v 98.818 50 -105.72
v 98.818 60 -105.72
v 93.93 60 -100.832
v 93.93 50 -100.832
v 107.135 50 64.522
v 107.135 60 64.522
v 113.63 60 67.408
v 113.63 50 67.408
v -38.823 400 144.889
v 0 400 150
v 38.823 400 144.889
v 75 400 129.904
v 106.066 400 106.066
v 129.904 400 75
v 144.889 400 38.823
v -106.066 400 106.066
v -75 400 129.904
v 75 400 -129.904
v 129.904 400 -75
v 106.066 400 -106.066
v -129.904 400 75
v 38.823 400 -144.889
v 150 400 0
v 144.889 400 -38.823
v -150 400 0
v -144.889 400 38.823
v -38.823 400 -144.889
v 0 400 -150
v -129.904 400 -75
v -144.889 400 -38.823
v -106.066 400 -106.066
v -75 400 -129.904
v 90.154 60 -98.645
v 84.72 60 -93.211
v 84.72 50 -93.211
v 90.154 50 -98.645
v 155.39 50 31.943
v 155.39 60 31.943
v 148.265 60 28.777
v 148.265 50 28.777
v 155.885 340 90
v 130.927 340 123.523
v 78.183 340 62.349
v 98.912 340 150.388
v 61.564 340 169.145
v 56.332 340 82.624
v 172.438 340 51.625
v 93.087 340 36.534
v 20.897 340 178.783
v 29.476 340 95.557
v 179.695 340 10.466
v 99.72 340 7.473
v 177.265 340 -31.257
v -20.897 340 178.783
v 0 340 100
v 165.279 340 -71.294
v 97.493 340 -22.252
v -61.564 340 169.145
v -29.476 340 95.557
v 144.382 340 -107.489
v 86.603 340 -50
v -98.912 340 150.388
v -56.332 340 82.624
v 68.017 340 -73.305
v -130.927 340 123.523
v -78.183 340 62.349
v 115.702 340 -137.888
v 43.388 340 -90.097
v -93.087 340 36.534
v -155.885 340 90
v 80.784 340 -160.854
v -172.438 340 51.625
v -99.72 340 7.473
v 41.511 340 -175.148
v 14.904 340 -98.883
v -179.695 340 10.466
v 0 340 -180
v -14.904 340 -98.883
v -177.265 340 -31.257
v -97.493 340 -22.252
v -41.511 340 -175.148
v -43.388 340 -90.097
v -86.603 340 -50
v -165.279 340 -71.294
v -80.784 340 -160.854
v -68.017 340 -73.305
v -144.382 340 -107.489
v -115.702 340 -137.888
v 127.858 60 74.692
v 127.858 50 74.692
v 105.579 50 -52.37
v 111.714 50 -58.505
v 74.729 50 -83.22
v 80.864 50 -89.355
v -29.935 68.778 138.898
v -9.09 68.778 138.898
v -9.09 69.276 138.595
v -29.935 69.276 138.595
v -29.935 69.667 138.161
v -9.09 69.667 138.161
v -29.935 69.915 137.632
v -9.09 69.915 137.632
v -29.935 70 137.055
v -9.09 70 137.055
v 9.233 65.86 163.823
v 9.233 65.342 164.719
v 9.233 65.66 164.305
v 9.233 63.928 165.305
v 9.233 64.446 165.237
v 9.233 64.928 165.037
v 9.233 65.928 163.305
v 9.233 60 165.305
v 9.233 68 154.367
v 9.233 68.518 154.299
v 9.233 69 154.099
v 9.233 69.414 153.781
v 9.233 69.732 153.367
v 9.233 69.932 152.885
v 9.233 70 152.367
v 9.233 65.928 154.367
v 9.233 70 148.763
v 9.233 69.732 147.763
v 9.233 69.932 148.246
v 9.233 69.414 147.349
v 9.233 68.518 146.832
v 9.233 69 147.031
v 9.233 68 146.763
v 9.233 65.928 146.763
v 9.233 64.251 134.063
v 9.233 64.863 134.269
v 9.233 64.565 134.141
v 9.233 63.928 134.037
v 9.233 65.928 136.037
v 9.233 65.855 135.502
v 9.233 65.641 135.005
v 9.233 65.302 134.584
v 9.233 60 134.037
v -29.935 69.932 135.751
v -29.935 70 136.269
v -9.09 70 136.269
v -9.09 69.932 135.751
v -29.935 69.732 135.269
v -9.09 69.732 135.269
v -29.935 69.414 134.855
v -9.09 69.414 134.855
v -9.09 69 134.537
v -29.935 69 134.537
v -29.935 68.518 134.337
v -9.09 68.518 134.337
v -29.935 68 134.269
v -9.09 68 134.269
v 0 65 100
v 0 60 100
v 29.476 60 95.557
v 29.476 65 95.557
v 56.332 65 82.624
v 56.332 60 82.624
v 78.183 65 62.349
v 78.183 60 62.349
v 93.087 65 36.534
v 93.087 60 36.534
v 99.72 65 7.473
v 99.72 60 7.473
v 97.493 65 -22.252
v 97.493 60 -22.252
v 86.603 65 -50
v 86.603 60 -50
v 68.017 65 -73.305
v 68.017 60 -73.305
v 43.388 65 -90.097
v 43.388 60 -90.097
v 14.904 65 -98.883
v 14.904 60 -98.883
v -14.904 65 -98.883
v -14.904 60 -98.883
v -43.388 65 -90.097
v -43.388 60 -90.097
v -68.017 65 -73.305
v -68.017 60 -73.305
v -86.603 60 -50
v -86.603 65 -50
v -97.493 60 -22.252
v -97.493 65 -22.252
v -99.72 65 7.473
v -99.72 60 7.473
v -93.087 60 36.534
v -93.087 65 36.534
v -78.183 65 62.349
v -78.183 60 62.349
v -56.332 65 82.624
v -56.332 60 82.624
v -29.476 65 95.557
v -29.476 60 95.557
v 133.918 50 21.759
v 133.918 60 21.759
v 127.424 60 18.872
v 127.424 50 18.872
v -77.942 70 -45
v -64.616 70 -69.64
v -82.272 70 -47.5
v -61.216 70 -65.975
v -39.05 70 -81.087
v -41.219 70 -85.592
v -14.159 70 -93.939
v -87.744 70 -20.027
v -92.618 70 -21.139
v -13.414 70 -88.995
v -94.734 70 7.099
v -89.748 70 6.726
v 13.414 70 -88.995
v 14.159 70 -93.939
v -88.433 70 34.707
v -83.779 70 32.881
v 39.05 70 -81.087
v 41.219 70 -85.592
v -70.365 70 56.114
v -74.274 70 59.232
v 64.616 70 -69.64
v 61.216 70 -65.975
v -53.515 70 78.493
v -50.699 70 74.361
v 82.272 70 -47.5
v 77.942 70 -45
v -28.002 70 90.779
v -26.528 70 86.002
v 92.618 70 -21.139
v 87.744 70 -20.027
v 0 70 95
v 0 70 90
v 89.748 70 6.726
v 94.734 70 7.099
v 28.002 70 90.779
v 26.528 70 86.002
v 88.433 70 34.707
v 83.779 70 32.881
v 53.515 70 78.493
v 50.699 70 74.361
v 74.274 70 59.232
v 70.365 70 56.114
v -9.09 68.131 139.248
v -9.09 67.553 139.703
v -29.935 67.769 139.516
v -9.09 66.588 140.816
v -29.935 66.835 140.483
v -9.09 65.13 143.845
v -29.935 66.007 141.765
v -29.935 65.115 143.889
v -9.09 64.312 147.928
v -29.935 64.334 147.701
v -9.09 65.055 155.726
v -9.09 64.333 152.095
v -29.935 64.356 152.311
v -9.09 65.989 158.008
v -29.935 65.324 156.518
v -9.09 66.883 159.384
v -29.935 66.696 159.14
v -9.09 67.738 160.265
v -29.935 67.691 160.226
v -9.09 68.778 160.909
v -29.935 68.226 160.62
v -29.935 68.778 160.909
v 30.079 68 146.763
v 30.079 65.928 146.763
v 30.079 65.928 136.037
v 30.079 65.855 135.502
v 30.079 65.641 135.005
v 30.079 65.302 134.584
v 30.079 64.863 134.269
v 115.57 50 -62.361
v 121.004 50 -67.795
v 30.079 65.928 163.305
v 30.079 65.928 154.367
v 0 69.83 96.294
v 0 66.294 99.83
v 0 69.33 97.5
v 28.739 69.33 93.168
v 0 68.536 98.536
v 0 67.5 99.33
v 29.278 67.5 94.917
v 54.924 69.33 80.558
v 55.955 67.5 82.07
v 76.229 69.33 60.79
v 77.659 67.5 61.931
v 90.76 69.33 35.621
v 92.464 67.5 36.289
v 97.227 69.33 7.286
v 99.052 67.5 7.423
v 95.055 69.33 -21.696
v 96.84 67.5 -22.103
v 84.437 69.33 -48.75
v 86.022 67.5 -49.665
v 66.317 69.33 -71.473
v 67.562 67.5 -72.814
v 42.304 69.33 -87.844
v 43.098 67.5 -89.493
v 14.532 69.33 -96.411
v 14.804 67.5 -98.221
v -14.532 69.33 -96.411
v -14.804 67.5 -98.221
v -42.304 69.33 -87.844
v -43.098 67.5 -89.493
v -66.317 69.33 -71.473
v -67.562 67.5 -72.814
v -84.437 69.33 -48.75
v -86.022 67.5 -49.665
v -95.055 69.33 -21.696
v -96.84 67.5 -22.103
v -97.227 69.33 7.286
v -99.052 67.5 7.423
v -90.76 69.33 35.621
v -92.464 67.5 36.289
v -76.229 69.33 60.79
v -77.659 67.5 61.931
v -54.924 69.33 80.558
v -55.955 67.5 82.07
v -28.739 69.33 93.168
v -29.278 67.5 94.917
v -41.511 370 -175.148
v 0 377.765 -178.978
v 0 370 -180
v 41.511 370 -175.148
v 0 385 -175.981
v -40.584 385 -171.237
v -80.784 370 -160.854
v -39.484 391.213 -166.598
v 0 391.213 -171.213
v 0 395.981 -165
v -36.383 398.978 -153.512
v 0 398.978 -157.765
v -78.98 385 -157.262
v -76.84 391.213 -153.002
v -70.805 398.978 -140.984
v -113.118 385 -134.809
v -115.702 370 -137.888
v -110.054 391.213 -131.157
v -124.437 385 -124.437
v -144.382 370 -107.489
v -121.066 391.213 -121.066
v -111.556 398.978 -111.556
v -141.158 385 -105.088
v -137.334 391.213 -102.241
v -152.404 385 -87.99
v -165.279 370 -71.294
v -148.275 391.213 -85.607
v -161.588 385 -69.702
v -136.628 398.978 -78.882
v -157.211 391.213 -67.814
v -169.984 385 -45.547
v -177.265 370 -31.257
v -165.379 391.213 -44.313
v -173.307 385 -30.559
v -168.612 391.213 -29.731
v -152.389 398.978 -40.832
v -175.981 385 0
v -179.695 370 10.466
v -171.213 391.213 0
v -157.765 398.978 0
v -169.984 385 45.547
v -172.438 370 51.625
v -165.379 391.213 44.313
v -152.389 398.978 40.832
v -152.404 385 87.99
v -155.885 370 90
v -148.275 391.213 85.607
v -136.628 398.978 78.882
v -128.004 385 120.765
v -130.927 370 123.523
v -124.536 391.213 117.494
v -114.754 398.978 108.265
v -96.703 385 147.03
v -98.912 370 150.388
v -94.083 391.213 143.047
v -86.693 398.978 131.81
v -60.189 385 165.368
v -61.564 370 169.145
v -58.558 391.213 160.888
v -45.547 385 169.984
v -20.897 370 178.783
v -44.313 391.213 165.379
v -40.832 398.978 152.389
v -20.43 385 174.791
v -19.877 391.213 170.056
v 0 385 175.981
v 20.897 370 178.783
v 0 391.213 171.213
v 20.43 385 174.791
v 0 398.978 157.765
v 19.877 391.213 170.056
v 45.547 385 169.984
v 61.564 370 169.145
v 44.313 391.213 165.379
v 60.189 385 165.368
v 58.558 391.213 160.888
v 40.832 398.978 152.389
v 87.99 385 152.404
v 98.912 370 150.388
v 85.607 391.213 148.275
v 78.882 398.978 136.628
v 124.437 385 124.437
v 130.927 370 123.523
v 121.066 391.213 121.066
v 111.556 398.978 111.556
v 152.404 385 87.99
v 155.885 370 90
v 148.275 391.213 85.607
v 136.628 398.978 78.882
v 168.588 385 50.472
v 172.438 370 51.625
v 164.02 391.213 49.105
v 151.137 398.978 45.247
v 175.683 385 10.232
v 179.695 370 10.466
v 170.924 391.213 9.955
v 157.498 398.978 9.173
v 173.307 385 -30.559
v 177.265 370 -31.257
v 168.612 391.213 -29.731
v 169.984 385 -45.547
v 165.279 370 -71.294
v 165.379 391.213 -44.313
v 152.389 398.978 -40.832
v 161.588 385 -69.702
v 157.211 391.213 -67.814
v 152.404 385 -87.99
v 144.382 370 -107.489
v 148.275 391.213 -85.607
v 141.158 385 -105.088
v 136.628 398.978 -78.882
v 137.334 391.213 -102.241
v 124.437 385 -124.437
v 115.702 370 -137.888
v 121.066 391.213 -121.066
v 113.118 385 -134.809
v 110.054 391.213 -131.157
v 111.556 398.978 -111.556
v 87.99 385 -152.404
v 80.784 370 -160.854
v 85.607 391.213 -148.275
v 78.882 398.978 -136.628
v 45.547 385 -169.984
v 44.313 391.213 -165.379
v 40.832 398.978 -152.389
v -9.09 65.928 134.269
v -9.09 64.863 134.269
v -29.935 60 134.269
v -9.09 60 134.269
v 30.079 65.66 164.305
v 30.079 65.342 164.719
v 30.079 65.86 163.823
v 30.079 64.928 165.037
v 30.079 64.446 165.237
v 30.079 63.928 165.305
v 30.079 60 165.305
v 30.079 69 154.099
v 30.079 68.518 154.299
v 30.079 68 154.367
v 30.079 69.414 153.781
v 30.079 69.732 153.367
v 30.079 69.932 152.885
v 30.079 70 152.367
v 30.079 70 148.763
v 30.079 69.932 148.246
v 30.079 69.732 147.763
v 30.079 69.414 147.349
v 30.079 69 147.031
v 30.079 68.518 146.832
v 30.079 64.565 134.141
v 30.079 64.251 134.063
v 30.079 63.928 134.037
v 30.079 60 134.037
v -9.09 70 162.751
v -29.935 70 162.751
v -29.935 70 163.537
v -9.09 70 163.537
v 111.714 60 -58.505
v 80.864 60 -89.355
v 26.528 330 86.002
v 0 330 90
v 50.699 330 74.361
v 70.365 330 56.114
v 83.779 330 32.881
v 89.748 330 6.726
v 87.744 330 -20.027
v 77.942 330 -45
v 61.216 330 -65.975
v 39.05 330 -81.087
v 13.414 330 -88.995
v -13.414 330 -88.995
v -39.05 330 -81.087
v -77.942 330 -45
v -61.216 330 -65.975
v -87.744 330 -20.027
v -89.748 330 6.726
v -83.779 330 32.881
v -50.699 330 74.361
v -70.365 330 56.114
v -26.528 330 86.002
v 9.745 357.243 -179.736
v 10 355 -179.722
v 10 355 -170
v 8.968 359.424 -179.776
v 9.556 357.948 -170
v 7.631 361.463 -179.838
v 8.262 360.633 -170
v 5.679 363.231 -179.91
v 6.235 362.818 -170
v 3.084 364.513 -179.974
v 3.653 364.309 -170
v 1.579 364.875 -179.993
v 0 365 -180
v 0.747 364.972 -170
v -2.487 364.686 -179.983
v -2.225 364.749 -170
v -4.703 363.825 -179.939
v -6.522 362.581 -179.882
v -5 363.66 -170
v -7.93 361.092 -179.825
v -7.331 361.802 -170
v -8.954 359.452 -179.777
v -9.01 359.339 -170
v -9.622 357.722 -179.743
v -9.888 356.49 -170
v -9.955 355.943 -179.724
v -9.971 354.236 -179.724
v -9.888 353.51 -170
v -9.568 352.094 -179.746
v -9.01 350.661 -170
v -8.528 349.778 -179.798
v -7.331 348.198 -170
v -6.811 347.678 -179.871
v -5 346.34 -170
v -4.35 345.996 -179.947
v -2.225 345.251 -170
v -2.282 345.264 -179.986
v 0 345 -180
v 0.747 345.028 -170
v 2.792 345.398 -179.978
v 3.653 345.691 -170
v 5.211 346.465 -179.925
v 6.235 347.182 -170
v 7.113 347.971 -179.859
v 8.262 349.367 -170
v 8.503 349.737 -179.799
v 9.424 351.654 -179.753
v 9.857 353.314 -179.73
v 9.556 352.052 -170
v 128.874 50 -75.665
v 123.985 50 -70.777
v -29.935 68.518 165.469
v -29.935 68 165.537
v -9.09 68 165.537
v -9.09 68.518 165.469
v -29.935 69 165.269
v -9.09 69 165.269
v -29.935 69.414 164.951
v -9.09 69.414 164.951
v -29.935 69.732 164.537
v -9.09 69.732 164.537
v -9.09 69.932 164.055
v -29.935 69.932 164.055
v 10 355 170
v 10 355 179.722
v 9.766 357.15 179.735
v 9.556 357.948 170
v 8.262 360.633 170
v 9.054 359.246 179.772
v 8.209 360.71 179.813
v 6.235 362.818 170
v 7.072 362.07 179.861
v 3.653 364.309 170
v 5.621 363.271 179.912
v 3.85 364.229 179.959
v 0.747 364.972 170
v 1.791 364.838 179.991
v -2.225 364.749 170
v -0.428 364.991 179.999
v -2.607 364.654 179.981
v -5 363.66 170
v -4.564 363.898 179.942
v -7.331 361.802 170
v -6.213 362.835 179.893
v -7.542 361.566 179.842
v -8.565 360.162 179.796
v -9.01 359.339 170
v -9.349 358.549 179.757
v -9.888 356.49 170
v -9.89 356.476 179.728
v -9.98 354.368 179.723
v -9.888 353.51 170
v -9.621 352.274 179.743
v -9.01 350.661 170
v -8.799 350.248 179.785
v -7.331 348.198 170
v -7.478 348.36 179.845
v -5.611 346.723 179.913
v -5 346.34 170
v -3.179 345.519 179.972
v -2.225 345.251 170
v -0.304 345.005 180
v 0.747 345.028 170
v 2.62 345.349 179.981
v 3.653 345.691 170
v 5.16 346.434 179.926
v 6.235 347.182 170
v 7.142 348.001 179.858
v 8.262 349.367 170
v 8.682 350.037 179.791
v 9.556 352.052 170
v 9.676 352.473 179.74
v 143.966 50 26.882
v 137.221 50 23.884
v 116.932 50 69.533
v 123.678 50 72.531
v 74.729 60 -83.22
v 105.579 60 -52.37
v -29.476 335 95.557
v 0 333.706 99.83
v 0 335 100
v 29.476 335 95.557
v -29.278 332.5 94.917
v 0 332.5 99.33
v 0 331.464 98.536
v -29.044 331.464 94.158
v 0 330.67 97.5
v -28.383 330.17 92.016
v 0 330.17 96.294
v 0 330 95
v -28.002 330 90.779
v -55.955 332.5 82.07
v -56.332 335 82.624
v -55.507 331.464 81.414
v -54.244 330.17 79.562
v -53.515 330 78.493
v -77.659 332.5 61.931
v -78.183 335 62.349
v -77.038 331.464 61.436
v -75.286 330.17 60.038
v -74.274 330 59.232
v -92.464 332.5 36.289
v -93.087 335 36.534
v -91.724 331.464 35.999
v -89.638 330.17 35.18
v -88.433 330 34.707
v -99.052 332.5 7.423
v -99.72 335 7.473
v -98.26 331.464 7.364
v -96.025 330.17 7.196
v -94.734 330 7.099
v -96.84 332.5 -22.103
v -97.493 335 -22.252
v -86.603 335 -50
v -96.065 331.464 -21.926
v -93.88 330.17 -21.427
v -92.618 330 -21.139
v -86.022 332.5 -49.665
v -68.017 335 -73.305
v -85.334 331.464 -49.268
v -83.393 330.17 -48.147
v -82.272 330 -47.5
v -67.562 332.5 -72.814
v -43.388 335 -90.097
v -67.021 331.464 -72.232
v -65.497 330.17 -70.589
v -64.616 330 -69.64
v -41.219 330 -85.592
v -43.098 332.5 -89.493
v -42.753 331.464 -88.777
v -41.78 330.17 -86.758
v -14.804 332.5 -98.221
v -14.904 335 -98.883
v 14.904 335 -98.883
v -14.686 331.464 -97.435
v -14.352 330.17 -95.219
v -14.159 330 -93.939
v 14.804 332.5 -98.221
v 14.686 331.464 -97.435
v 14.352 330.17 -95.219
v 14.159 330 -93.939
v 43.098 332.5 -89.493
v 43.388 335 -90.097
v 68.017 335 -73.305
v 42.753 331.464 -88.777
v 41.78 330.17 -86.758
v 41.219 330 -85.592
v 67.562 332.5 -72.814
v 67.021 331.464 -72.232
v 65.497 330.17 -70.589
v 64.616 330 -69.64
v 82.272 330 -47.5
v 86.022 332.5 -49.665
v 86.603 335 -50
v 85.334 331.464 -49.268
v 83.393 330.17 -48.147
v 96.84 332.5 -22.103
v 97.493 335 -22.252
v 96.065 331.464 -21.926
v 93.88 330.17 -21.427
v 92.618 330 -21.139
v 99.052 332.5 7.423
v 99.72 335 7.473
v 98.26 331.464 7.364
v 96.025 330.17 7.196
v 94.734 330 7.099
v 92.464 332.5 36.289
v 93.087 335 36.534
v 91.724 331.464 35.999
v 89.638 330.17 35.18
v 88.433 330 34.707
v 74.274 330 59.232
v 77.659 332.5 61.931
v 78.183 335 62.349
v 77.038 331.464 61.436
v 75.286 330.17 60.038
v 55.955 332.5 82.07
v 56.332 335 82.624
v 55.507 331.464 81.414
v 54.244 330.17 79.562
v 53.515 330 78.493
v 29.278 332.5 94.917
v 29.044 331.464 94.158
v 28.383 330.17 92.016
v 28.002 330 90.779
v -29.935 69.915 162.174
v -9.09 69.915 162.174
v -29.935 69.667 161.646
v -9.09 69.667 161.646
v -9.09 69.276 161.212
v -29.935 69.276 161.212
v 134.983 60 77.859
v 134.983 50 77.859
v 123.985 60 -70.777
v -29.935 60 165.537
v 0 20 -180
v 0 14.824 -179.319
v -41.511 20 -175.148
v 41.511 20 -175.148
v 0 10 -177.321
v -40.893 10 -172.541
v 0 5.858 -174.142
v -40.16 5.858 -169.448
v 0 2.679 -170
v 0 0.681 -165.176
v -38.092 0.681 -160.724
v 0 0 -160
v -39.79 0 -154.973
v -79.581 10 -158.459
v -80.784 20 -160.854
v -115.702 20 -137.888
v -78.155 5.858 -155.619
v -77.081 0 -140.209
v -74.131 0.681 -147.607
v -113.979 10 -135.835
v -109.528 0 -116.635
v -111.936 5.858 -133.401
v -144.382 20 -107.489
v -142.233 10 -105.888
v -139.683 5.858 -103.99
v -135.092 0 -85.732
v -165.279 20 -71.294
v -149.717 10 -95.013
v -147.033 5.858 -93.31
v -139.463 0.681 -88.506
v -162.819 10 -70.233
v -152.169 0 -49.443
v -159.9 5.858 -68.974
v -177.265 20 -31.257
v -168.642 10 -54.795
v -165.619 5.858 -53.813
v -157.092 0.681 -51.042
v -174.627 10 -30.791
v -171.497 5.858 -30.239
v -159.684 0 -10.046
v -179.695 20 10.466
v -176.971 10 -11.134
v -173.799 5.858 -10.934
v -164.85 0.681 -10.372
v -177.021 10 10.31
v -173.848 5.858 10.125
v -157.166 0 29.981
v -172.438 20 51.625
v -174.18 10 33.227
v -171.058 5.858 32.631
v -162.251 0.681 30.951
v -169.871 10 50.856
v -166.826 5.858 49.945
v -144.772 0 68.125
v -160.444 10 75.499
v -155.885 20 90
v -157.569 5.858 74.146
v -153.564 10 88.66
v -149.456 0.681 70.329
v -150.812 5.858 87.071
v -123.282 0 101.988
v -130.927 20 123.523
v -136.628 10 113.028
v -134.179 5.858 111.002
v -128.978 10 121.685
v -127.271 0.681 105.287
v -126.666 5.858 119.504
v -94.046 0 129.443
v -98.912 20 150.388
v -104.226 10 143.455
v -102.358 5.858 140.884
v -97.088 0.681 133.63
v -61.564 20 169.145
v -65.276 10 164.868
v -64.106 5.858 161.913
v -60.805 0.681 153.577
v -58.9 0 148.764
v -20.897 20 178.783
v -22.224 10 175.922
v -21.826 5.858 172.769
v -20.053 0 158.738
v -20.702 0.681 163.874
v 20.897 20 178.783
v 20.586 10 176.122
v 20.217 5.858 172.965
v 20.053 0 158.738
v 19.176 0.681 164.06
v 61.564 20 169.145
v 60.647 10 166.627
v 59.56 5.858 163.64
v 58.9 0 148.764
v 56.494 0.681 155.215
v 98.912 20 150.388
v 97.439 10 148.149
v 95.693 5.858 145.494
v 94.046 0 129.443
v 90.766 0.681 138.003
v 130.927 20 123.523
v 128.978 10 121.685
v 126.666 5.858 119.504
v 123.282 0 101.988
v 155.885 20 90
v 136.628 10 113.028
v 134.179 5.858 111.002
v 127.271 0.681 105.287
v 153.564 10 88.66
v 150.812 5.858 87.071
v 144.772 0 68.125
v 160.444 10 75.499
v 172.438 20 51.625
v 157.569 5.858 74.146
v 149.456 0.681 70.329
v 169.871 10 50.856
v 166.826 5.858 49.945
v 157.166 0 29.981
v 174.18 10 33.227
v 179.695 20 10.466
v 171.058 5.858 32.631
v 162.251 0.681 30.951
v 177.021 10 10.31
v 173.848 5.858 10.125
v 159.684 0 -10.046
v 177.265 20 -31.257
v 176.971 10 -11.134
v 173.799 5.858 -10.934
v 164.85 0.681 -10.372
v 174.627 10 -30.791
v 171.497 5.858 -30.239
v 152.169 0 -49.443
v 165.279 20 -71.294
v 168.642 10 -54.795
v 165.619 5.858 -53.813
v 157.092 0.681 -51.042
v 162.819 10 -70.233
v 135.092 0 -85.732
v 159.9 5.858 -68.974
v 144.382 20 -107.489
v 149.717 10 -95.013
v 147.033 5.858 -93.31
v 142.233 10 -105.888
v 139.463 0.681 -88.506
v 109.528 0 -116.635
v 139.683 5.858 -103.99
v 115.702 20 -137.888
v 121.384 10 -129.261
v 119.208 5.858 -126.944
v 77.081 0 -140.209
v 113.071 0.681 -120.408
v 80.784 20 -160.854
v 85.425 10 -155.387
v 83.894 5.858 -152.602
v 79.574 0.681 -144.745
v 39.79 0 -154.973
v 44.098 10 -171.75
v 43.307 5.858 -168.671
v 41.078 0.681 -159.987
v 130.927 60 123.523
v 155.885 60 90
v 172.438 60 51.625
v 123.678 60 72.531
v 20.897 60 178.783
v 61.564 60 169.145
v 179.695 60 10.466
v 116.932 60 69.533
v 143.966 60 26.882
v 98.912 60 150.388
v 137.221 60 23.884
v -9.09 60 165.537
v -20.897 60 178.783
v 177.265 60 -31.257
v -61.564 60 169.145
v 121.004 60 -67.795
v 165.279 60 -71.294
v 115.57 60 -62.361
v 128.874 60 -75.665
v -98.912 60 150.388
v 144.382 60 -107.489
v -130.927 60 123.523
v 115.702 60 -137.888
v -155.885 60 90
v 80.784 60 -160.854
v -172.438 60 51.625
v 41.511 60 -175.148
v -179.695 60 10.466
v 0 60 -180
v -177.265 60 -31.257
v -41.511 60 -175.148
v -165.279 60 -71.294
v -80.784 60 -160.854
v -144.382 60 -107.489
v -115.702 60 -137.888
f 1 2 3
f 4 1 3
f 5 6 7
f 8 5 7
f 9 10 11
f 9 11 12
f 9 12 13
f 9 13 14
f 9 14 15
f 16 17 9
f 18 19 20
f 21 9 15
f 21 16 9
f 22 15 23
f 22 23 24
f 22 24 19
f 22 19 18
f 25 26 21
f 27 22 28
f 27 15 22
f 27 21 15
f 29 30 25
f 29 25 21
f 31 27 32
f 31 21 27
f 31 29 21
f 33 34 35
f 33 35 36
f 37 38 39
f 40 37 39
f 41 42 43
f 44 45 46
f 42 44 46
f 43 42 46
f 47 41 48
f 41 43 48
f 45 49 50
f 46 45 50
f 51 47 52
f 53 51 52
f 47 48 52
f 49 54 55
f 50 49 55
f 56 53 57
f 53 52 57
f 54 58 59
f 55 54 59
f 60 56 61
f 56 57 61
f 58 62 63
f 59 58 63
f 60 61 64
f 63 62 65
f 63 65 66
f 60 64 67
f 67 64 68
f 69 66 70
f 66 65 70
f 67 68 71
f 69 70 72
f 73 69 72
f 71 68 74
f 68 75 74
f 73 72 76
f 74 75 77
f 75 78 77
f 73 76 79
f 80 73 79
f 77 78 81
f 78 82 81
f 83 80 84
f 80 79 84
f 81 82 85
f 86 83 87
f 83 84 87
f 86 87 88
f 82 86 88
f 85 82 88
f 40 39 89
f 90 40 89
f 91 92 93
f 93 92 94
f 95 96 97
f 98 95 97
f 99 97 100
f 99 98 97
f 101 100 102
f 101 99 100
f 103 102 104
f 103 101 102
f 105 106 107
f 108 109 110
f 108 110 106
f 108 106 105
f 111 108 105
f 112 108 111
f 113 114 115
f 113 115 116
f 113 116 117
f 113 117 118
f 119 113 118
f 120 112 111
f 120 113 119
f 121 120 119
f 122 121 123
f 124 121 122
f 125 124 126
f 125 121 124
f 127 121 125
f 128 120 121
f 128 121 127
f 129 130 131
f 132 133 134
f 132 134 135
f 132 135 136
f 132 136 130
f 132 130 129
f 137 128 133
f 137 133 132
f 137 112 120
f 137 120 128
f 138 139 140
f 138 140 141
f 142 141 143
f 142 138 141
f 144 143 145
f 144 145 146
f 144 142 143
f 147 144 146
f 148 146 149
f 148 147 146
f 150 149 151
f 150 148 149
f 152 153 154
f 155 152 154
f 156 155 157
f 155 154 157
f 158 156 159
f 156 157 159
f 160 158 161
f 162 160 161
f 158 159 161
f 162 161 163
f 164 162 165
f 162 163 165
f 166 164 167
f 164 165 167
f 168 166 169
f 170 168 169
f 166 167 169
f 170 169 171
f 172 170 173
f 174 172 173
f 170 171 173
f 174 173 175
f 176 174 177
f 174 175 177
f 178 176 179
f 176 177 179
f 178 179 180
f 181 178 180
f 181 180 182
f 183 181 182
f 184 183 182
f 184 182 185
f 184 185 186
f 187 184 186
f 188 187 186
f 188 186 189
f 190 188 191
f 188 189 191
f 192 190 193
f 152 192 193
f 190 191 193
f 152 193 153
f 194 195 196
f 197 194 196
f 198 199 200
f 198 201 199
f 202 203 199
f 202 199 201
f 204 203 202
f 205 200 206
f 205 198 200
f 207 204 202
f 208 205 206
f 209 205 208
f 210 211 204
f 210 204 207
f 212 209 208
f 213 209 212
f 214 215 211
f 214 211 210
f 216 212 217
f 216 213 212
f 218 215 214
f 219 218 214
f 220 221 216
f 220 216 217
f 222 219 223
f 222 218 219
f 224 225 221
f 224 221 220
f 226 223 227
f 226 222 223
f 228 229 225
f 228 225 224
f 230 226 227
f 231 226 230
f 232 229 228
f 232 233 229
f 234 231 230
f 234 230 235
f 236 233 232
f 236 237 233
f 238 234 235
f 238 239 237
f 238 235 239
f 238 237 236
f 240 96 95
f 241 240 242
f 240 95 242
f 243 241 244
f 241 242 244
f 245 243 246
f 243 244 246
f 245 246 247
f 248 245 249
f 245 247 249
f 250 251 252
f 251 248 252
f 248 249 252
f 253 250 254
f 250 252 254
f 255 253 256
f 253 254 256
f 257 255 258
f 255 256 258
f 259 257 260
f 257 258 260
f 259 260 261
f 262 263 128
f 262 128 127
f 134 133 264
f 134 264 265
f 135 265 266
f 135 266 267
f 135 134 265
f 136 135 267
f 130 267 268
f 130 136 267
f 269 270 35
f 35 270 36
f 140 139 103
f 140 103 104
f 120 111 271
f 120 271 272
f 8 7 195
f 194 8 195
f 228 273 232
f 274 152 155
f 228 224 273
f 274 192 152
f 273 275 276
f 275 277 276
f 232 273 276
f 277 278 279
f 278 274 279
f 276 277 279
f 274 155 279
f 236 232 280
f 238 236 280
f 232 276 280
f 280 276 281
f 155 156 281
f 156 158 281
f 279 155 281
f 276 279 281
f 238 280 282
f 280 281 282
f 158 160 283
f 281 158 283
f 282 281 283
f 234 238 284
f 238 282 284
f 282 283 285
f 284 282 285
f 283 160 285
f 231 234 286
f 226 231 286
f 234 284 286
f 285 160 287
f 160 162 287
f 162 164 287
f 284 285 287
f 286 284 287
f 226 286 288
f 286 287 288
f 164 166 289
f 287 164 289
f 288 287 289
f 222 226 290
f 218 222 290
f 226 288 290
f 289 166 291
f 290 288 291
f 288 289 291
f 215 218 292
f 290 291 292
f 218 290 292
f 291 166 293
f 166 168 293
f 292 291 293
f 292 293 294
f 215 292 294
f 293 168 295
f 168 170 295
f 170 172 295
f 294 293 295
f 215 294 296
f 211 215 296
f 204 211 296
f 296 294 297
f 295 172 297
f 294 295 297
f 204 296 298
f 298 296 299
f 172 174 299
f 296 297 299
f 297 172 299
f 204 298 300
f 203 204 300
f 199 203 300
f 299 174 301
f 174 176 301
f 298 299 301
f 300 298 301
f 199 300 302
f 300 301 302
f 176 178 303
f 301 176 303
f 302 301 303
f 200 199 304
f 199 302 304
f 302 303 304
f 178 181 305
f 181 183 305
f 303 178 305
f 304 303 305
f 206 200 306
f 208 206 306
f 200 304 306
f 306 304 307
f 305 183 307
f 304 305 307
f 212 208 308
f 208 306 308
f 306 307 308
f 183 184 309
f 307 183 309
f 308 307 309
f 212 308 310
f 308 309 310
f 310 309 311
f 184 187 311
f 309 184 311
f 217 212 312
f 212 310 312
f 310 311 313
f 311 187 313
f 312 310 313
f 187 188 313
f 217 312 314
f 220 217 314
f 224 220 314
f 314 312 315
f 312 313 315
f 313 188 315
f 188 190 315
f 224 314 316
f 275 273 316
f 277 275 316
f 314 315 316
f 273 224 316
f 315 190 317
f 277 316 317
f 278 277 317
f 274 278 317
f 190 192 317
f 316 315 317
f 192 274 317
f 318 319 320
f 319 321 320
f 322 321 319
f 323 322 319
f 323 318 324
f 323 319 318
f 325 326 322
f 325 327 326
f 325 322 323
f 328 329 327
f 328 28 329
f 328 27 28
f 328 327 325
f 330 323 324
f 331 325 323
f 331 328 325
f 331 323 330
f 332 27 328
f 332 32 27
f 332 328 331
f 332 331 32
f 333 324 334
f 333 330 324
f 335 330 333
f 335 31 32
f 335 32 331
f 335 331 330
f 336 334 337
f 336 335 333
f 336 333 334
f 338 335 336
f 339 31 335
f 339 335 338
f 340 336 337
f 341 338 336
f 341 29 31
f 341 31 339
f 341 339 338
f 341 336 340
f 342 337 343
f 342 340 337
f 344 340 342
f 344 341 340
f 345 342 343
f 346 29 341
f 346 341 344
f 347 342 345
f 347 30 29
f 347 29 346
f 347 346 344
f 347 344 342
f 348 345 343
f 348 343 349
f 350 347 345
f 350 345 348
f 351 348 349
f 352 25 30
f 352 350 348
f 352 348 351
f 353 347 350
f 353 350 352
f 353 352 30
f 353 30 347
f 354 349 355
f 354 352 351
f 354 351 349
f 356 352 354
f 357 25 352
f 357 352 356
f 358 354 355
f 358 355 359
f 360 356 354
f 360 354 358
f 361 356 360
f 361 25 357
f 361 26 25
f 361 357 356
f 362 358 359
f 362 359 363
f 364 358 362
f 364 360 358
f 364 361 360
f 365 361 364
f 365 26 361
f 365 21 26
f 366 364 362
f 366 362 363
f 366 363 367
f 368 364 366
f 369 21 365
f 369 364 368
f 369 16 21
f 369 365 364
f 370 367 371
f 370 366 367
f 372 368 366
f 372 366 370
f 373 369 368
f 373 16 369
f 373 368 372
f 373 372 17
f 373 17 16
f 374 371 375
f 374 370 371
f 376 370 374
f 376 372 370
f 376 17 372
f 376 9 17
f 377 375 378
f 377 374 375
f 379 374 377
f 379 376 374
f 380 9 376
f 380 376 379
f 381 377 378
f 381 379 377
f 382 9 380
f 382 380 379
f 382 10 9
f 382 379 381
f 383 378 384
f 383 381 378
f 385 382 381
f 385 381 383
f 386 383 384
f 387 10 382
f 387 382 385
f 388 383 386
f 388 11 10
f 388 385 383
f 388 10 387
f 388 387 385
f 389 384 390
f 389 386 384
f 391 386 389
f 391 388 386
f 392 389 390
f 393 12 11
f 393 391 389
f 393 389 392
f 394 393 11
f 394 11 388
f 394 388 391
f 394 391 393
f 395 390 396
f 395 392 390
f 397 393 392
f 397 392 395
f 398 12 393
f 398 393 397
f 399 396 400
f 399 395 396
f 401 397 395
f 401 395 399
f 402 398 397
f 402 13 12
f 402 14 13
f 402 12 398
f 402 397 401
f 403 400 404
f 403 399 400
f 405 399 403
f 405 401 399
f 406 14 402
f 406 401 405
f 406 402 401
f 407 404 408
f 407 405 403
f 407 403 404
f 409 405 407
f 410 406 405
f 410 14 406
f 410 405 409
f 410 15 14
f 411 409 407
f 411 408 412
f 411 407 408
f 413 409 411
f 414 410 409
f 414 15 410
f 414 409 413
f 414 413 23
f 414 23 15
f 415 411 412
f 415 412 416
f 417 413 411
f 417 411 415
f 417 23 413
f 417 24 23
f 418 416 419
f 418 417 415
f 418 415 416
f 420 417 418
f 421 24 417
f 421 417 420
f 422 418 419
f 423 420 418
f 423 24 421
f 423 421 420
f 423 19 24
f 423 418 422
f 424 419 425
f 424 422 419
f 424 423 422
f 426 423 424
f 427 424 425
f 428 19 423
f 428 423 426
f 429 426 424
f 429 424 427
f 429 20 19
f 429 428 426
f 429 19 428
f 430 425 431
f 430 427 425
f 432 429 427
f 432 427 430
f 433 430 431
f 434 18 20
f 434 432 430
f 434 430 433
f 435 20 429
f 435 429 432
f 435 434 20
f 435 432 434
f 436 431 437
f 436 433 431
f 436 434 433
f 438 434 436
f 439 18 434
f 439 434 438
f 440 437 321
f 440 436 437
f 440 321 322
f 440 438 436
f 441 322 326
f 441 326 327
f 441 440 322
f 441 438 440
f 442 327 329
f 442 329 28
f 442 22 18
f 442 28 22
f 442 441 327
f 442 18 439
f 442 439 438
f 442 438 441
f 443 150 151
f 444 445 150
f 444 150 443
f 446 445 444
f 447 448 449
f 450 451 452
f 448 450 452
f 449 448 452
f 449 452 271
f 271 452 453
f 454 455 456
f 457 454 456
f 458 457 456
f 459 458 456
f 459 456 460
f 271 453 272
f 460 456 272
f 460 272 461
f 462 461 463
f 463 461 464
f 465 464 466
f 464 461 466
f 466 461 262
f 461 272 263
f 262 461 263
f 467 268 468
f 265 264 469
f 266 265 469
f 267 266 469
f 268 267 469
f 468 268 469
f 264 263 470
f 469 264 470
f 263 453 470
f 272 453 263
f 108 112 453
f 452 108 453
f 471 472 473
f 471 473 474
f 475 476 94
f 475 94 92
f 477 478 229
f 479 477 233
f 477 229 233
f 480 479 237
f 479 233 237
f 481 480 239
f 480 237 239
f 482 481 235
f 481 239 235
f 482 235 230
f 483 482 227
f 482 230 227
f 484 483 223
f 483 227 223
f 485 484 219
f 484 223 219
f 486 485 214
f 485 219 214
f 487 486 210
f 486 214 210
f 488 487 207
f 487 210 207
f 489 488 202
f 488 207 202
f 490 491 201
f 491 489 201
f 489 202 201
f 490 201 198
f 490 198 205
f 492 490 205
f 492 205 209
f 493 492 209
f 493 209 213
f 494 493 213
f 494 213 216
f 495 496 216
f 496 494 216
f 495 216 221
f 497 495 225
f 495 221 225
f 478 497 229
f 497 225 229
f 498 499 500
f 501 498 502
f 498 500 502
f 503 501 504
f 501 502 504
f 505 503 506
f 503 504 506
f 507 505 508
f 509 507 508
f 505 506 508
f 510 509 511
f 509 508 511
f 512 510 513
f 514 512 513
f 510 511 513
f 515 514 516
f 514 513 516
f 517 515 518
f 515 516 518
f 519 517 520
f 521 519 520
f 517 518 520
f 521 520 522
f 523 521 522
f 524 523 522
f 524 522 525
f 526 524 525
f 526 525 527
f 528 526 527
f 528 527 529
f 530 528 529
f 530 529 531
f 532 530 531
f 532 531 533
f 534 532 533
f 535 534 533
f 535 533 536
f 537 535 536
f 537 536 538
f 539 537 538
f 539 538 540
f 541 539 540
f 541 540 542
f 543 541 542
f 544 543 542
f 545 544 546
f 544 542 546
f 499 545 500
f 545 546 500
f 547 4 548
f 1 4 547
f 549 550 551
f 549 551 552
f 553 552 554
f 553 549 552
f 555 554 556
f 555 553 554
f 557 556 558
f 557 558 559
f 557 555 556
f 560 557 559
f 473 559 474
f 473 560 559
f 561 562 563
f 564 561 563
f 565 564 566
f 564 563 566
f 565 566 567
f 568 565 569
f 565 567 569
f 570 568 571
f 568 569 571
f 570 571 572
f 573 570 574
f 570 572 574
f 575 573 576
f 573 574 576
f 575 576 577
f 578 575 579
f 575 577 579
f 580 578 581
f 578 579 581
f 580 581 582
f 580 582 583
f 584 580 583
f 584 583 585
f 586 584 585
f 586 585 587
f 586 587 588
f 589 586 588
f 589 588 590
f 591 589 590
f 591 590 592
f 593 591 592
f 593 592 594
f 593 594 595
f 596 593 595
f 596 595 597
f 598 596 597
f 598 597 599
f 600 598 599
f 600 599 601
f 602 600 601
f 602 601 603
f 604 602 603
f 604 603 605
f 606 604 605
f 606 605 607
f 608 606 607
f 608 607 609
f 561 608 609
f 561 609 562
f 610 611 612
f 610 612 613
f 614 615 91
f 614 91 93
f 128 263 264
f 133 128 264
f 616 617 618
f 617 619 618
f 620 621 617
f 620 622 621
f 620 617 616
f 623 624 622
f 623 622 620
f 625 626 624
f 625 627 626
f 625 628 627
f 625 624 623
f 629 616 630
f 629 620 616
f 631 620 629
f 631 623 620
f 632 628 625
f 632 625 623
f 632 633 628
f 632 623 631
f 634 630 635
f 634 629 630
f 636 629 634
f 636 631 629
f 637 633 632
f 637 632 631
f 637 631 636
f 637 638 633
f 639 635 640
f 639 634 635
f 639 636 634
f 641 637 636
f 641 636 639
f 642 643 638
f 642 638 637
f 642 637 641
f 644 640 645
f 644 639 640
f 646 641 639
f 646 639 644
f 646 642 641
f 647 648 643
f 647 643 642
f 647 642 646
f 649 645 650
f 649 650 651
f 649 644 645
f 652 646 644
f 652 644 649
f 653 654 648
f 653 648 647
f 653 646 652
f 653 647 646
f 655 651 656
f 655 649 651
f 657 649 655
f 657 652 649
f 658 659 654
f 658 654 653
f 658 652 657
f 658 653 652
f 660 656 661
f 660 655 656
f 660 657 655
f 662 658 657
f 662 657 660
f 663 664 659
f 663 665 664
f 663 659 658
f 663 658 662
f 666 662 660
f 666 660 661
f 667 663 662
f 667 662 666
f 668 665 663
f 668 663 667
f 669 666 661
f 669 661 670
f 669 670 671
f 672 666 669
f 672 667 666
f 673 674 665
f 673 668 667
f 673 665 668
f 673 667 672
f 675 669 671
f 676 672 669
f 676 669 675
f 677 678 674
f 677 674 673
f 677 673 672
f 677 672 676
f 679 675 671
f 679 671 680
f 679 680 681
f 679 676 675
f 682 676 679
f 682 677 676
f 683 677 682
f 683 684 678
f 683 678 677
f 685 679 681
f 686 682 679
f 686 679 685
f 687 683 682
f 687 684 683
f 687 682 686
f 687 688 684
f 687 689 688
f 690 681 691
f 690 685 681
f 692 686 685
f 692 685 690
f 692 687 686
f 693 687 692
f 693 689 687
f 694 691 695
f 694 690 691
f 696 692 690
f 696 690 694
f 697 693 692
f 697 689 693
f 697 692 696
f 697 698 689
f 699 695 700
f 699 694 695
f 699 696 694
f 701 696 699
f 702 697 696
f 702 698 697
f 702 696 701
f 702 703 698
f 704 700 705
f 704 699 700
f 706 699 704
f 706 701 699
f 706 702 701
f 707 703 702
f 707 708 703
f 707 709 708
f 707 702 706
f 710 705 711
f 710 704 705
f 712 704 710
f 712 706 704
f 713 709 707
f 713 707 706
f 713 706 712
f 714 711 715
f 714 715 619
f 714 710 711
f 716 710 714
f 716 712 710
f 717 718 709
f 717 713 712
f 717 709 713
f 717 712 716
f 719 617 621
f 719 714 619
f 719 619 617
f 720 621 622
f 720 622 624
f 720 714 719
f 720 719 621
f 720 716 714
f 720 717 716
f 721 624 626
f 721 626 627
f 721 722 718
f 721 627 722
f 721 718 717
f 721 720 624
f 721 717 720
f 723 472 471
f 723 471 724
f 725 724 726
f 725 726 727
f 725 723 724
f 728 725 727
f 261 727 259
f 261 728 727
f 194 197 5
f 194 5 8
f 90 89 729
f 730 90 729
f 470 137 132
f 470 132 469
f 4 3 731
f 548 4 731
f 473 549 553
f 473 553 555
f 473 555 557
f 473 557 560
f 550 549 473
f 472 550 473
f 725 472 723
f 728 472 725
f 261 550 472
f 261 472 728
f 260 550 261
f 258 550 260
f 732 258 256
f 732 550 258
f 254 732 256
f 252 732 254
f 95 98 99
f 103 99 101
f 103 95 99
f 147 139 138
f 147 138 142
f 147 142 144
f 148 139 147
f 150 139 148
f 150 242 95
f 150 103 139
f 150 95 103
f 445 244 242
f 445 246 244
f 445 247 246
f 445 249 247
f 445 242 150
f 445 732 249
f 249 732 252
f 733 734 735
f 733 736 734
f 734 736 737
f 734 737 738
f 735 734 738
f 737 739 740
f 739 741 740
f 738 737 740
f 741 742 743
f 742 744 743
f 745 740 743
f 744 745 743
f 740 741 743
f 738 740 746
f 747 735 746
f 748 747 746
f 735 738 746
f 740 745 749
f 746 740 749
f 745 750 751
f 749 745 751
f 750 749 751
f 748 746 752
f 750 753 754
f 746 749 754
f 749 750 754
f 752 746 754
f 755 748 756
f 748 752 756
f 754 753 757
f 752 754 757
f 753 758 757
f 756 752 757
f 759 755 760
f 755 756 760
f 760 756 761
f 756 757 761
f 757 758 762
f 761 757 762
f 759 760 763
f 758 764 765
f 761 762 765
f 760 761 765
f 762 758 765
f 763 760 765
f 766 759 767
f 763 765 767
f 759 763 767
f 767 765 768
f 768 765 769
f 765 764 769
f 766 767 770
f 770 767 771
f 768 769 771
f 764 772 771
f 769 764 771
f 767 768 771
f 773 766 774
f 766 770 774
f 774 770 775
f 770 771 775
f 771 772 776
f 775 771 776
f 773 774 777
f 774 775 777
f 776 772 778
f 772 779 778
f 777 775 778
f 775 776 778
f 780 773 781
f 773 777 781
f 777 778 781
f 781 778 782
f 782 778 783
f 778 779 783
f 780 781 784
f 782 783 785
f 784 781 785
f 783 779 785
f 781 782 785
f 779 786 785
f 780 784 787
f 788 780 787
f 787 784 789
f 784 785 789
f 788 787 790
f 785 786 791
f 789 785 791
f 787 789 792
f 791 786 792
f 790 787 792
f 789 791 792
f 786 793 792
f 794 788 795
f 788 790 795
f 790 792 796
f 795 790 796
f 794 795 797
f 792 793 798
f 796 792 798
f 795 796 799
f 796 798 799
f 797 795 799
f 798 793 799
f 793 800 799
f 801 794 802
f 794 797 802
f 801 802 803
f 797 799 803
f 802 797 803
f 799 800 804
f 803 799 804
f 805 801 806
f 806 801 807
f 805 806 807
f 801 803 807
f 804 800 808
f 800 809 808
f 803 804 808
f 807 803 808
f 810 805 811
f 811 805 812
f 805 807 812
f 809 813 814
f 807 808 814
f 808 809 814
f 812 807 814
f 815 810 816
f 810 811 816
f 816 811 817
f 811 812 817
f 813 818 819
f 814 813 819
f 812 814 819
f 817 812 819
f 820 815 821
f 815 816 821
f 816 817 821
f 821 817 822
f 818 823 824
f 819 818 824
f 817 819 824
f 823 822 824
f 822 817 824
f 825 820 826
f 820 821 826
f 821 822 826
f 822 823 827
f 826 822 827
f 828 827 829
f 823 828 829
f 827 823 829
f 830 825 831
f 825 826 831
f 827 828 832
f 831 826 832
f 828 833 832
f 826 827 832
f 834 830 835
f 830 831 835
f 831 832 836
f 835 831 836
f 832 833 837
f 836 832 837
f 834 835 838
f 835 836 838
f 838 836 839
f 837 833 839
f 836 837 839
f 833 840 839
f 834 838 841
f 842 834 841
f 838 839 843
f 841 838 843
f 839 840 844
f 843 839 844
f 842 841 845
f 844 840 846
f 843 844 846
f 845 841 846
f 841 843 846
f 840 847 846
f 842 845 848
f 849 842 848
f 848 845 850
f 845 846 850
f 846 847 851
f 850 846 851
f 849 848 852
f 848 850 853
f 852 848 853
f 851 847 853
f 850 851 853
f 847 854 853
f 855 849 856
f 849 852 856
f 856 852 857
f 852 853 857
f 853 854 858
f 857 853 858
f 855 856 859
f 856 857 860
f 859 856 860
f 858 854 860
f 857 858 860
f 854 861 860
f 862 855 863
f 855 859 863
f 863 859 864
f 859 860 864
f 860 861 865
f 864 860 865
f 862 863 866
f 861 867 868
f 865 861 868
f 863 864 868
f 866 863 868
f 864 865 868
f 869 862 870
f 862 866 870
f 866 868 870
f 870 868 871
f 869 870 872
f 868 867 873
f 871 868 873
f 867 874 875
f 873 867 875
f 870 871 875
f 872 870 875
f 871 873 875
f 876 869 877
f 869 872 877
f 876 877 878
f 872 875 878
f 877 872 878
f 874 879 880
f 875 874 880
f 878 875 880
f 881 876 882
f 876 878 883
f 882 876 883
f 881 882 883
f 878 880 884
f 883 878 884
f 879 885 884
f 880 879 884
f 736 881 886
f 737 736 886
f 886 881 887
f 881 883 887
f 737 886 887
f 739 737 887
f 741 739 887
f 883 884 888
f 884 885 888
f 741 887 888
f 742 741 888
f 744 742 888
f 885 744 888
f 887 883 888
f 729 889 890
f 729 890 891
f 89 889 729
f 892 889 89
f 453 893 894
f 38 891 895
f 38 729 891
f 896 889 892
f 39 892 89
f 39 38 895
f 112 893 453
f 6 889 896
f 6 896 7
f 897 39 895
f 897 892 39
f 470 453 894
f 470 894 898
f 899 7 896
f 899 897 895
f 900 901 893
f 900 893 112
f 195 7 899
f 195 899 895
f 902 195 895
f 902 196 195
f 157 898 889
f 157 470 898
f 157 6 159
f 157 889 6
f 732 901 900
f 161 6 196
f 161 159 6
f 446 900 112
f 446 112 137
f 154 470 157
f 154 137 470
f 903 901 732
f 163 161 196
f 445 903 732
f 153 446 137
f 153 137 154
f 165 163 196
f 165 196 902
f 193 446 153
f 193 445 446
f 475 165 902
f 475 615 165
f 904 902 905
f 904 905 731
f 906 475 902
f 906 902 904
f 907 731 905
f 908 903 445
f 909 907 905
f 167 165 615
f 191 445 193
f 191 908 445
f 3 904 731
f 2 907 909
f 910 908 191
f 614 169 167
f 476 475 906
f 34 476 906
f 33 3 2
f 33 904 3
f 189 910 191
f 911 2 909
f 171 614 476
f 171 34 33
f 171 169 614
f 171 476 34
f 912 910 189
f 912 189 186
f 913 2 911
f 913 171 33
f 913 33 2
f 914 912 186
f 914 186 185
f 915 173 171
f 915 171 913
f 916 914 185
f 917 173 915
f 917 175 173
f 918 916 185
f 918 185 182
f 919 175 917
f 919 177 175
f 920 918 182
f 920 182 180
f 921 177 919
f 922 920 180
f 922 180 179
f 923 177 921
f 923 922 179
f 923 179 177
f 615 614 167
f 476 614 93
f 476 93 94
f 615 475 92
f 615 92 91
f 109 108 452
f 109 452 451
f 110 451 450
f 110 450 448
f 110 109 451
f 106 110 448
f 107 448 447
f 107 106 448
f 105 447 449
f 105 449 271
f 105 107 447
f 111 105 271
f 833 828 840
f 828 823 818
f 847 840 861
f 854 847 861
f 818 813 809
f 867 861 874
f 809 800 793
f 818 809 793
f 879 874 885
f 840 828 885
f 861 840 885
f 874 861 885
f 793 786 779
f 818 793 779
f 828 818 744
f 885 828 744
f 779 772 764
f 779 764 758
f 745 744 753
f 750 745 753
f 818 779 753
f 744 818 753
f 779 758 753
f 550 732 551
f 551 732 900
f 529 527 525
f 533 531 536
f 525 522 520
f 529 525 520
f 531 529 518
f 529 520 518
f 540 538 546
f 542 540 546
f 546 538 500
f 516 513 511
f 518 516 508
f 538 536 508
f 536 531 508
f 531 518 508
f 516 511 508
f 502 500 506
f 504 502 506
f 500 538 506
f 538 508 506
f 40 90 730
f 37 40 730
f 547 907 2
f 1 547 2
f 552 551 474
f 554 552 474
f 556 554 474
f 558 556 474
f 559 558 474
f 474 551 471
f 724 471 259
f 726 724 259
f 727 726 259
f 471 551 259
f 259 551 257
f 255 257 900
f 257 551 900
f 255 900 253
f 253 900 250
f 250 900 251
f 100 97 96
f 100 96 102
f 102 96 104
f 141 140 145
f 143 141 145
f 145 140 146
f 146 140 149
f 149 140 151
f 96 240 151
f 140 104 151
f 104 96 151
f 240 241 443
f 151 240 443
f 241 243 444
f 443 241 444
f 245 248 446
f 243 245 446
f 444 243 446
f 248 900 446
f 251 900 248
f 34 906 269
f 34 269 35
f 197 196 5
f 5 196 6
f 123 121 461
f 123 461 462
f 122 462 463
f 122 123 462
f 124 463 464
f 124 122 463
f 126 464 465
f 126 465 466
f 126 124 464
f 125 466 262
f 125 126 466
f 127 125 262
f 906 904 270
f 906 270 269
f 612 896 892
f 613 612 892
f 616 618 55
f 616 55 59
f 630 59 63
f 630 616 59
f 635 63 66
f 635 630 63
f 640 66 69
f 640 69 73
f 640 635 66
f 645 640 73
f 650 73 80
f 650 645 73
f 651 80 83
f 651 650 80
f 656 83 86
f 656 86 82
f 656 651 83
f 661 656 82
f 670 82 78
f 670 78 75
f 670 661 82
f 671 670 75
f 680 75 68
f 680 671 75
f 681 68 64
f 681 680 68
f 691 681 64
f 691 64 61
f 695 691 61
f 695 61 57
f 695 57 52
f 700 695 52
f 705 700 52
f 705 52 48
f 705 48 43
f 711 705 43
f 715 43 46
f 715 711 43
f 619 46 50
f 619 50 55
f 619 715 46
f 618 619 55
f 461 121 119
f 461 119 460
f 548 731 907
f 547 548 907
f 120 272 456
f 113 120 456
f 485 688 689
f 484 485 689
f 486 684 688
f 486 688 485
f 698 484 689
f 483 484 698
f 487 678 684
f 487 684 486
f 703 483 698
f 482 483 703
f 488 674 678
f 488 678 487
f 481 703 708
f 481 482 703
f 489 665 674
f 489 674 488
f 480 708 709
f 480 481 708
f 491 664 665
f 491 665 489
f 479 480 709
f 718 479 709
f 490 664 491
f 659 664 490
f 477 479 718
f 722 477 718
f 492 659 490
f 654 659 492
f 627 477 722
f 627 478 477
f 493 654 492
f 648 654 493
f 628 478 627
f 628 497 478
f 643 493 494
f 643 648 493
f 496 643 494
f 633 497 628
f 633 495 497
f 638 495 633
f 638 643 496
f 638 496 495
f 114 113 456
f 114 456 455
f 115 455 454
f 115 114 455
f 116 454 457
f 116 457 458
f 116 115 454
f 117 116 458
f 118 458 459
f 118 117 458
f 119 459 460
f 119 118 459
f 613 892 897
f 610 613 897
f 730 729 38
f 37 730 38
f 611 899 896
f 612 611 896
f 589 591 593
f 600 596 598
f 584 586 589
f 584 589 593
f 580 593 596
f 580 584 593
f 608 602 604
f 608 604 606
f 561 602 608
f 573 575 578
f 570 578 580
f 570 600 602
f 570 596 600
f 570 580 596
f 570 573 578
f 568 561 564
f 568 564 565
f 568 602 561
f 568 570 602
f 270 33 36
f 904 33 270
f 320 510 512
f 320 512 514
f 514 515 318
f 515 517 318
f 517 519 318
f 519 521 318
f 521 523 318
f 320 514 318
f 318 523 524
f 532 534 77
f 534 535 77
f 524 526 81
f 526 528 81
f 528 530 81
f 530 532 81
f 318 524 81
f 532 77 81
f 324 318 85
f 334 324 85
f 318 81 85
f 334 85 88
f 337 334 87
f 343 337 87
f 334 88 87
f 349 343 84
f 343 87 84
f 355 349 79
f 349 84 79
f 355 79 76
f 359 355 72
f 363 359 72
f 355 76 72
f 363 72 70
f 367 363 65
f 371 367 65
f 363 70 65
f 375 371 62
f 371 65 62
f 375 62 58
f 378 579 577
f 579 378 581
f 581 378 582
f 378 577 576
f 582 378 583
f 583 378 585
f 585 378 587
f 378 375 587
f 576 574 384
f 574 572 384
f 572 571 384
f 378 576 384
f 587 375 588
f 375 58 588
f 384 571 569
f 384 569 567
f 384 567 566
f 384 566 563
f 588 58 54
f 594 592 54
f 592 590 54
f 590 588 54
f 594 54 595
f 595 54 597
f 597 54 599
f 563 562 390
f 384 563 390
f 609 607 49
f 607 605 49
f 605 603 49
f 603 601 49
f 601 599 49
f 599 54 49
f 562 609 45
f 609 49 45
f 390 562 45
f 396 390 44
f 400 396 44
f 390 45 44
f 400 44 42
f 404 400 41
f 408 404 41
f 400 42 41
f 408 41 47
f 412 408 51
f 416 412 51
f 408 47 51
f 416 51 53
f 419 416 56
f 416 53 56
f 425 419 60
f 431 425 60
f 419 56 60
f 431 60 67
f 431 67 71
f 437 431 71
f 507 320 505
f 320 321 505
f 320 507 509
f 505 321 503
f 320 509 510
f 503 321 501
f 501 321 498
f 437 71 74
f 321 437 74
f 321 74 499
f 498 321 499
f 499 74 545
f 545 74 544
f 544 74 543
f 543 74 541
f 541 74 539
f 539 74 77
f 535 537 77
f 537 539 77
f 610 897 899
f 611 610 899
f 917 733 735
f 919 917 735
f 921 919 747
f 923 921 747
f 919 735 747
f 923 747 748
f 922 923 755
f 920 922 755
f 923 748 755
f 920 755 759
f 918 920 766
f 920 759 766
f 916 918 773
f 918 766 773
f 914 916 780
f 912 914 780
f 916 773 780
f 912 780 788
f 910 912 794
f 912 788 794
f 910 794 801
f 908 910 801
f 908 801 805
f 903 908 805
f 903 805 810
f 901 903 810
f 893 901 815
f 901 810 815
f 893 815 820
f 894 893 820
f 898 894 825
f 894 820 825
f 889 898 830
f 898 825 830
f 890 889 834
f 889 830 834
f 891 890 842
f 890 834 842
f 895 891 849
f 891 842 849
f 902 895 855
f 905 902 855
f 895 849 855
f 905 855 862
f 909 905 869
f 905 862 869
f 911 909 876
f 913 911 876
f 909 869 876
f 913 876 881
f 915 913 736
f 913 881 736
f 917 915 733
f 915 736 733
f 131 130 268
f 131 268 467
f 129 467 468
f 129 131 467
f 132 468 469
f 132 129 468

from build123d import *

# Parameters (mm, degrees)
SKETCH1_R           = 180
BOSS_EXTRUDE1_DEPTH = 60
FILLET1_R           = 20
SKETCH2_R           = 100
BOSS_EXTRUDE3_DEPTH = 10
SKETCH3_R           = 90
BOSS_EXTRUDE4_DEPTH = 270
SKETCH4_R           = 180
BOSS_EXTRUDE5_DEPTH = 60
FILLET2_R           = 30
BOSS_EXTRUDE6_START = 10
SKETCH6_R           = 100
BOSS_EXTRUDE6_DEPTH = 10
FILLET3_R           = 5
SKETCH9_W           = 20.845427705
SKETCH9_H           = 31.268141557
BOSS_EXTRUDE7_DEPTH = 10
SKETCH10_R          = 10
CUT_EXTRUDE2_DEPTH  = 10
CUT_EXTRUDE3_START  = 10
SKETCH12_R          = 10
CUT_EXTRUDE3_DEPTH  = 10
SKETCH13_RX         = 11.260558061
SKETCH13_RY         = 5.777483036
CUT_EXTRUDE4_DEPTH  = 30
SKETCH14_W          = 10.93815799
SKETCH14_H          = 4.07197177
SKETCH14_W_2        = 12.726253657
CUT_EXTRUDE5_DEPTH  = 30
FILLET4_START       = -31
FILLET4_DEPTH       = 62
FILLET4_START_2     = -9.089801569
FILLET4_2_DEPTH     = 40.089801569
CUT_EXTRUDE6_DEPTH  = 10
CUT_EXTRUDE7_DEPTH  = 10


with BuildPart() as part:
    # Sketch1 → Boss-Extrude1 (new body)
    with BuildSketch(Plane(origin=(0, 0, 0), x_dir=(1, 0, 0), z_dir=(0, 1, 0))):
        with Locations(Location((0, 0, 0), (0, 0, 90))):
            Circle(SKETCH1_R)
    extrude(amount=BOSS_EXTRUDE1_DEPTH)

    # Fillet1
    fillet1_edges = [part.edges().sort_by_distance(p)[0] for p in [
        (0, 0, 180),
    ]]
    fillet(fillet1_edges, radius=FILLET1_R)

    # Sketch2 → Boss-Extrude3 (add)
    with BuildSketch(Plane(origin=(0, 60, 0), x_dir=(1, 0, 0), z_dir=(0, 1, 0))):
        with Locations(Location((0, 0, 0), (0, 0, 270))):
            Circle(SKETCH2_R)
    extrude(amount=BOSS_EXTRUDE3_DEPTH)

    # Sketch3 → Boss-Extrude4 (add)
    with BuildSketch(Plane(origin=(0, 70, 0), x_dir=(1, 0, 0), z_dir=(0, 1, 0))):
        with Locations(Location((0, 0, 0), (0, 0, 270))):
            Circle(SKETCH3_R)
    extrude(amount=BOSS_EXTRUDE4_DEPTH)

    # Sketch4 → Boss-Extrude5 (add)
    with BuildSketch(Plane(origin=(0, 340, 0), x_dir=(1, 0, 0), z_dir=(0, 1, 0))):
        with Locations(Location((0, 0, 0), (0, 0, 90))):
            Circle(SKETCH4_R)
    extrude(amount=BOSS_EXTRUDE5_DEPTH)

    # Fillet2
    fillet2_edges = [part.edges().sort_by_distance(p)[0] for p in [
        (0, 400, 180),
    ]]
    fillet(fillet2_edges, radius=FILLET2_R)

    # Sketch6 → Boss-Extrude6 (add)
    with BuildSketch(Plane.XZ.offset(-340).offset(BOSS_EXTRUDE6_START)):
        with Locations(Location((0, 0, 0), (0, 0, 90))):
            Circle(SKETCH6_R)
    extrude(amount=-BOSS_EXTRUDE6_DEPTH)

    # Fillet3
    fillet3_edges = [part.edges().sort_by_distance(p)[0] for p in [
        (0, 330, -100),
        (0, 70, -100),
    ]]
    fillet(fillet3_edges, radius=FILLET3_R)

    # Sketch9 → Boss-Extrude7 (add)
    with BuildSketch(Plane(origin=(0, 60, 0), x_dir=(1, 0, 0), z_dir=(0, 1, 0))):
        with Locations((-19.512515422, -149.90314923)):
            Rectangle(SKETCH9_W, SKETCH9_H)
        with Locations((19.656209668, -149.671177345)):
            Rectangle(SKETCH9_W, SKETCH9_H)
    extrude(amount=BOSS_EXTRUDE7_DEPTH)

    # Sketch10 → Cut-Extrude2 (cut)
    with BuildSketch(Plane.XY.offset(180)):
        with Locations((0, 355)):
            Circle(SKETCH10_R)
    extrude(amount=-CUT_EXTRUDE2_DEPTH, mode=Mode.SUBTRACT)

    # Sketch12 → Cut-Extrude3 (cut)
    with BuildSketch(Plane.XY.offset(-180).offset(CUT_EXTRUDE3_START)):
        with Locations((0, 355)):
            Circle(SKETCH12_R)
    extrude(amount=-CUT_EXTRUDE3_DEPTH, mode=Mode.SUBTRACT)

    # Sketch13 → Cut-Extrude4 (cut)
    with BuildSketch(Plane.ZY.offset(29.935229274)):
        with Locations((149.903149231, 70)):
            Ellipse(SKETCH13_RX, SKETCH13_RY)
    extrude(amount=-CUT_EXTRUDE4_DEPTH, mode=Mode.SUBTRACT)

    # Sketch14 → Cut-Extrude5 (cut)
    with BuildSketch(Plane(origin=(30.07892352, 0, 0), x_dir=(0, 0, -1), z_dir=(1, 0, 0))):
        with Locations((-159.836169129, 67.964014115)):
            Rectangle(SKETCH14_W, SKETCH14_H)
        with Locations((-140.400233395, 67.964014115)):
            Rectangle(SKETCH14_W_2, SKETCH14_H)
    extrude(amount=-CUT_EXTRUDE5_DEPTH, mode=Mode.SUBTRACT)

    # Fillet4: read off the stored shape, not the designer's step
    # Fillet4 outline → Fillet4 (cut)
    with BuildSketch(Plane.YZ.offset(FILLET4_START)):
        with BuildLine():
            Line((70, 165.537220009), (68, 165.537220009))
            ThreePointArc((68, 165.537220009), (69.414213562, 164.951433572), (70, 163.537220009))
            Line((70, 163.537220009), (70, 165.537220009))
        make_face()
        with BuildLine():
            Line((70, 161.163707292), (70, 162.751420247))
            ThreePointArc((70, 162.751420247), (69.666591866, 161.645765891), (68.777528446, 160.908745692))
            add(Edge.make_bspline(
                [(68.777528446, 160.908745692), (69.381765186, 161.163707292), (70, 161.163707292)],
                knots=[6.055563227, 6.055563227, 6.055563227, 6.283185307, 6.283185307, 6.283185307], degree=2, weights=[0.927415097, 0.957557219, 1]))
        make_face()
        with BuildLine():
            Line((70, 154.367090134), (68, 154.367090134))
            ThreePointArc((68, 154.367090134), (69.414213562, 153.781303696), (70, 152.367090134))
            Line((70, 152.367090134), (70, 154.367090134))
        make_face()
        with BuildLine():
            add(Edge.make_bspline(
                [(70, 138.642591169), (69.381765186, 138.642591169), (68.777528446, 138.897552769)],
                knots=[3.141592654, 3.141592654, 3.141592654, 3.369214734, 3.369214734, 3.369214734], degree=2, weights=[1, 0.957557219, 0.927415097]))
            ThreePointArc((68.777528446, 138.897552769), (69.666591866, 138.16053257), (70, 137.054878214))
            Line((70, 137.054878214), (70, 138.642591169))
        make_face()
        with BuildLine():
            ThreePointArc((70, 148.763360224), (69.414213562, 147.349146661), (68, 146.763360224))
            Line((68, 146.763360224), (70, 146.763360224))
            Line((70, 146.763360224), (70, 148.763360224))
        make_face()
        with BuildLine():
            Line((65.92802823, 134.269078452), (64.862948862, 134.269078452))
            ThreePointArc((64.862948862, 134.269078452), (64.409662828, 134.095965635), (63.92802823, 134.037106567))
            Line((63.92802823, 134.037106567), (65.92802823, 134.037106567))
            Line((65.92802823, 134.037106567), (65.92802823, 134.269078452))
        make_face()
        with BuildLine():
            ThreePointArc((70, 136.269078452), (69.414213562, 134.85486489), (68, 134.269078452))
            Line((68, 134.269078452), (70, 134.269078452))
            Line((70, 134.269078452), (70, 136.269078452))
        make_face()
    extrude(amount=FILLET4_DEPTH, mode=Mode.SUBTRACT)

    # Fillet4 2 outline → Fillet4 2 (cut)
    with BuildSketch(Plane.YZ.offset(FILLET4_START_2)):
        with BuildLine():
            ThreePointArc((63.92802823, 165.305248124), (65.342241792, 164.719461686), (65.92802823, 163.305248124))
            Line((65.92802823, 163.305248124), (65.92802823, 165.305248124))
            Line((65.92802823, 165.305248124), (63.92802823, 165.305248124))
        make_face()
        with BuildLine():
            Line((65.92802823, 134.269078452), (65.92802823, 136.037106567))
            ThreePointArc((65.92802823, 136.037106567), (65.641189236, 135.005079741), (64.862948862, 134.269078452))
            Line((64.862948862, 134.269078452), (65.92802823, 134.269078452))
        make_face()
    extrude(amount=FILLET4_2_DEPTH, mode=Mode.SUBTRACT)

    # Sketch22 → Cut-Extrude6 (cut)
    with BuildSketch(Plane(origin=(0, 60, 0), x_dir=(1, 0, 0), z_dir=(0, 1, 0))):
        Polygon((127.423760752, -18.872499432), (107.1351894, -64.521784974), (113.629623838, -67.40820028), (133.91819519, -21.758914738), align=None)
        Polygon((137.220873331, -23.883738258), (116.932301979, -69.5330238), (123.677729052, -72.530991388), (143.966300404, -26.881705846), align=None)
        Polygon((148.265392154, -28.776757418), (127.858476847, -74.692316859), (134.98259987, -77.858593758), (155.389515177, -31.943034317), align=None)
    extrude(amount=-CUT_EXTRUDE6_DEPTH, mode=Mode.SUBTRACT)

    # Sketch24 → Cut-Extrude7 (cut)
    with BuildSketch(Plane(origin=(0, 60, 0), x_dir=(1, 0, 0), z_dir=(0, 1, 0))):
        Polygon((111.713779985, 58.505093082), (105.578926162, 52.370239259), (74.729375507, 83.219789913), (80.86422933, 89.354643737), align=None)
        Polygon((115.569973817, 62.361286914), (84.720423162, 93.210837569), (90.154150834, 98.644565241), (121.003701489, 67.795014586), align=None)
        Polygon((93.930128704, 100.831618279), (123.985216943, 70.77653004), (128.873539941, 75.664853038), (98.818451702, 105.719941277), align=None)
    extrude(amount=-CUT_EXTRUDE7_DEPTH, mode=Mode.SUBTRACT)


solid = part.part
